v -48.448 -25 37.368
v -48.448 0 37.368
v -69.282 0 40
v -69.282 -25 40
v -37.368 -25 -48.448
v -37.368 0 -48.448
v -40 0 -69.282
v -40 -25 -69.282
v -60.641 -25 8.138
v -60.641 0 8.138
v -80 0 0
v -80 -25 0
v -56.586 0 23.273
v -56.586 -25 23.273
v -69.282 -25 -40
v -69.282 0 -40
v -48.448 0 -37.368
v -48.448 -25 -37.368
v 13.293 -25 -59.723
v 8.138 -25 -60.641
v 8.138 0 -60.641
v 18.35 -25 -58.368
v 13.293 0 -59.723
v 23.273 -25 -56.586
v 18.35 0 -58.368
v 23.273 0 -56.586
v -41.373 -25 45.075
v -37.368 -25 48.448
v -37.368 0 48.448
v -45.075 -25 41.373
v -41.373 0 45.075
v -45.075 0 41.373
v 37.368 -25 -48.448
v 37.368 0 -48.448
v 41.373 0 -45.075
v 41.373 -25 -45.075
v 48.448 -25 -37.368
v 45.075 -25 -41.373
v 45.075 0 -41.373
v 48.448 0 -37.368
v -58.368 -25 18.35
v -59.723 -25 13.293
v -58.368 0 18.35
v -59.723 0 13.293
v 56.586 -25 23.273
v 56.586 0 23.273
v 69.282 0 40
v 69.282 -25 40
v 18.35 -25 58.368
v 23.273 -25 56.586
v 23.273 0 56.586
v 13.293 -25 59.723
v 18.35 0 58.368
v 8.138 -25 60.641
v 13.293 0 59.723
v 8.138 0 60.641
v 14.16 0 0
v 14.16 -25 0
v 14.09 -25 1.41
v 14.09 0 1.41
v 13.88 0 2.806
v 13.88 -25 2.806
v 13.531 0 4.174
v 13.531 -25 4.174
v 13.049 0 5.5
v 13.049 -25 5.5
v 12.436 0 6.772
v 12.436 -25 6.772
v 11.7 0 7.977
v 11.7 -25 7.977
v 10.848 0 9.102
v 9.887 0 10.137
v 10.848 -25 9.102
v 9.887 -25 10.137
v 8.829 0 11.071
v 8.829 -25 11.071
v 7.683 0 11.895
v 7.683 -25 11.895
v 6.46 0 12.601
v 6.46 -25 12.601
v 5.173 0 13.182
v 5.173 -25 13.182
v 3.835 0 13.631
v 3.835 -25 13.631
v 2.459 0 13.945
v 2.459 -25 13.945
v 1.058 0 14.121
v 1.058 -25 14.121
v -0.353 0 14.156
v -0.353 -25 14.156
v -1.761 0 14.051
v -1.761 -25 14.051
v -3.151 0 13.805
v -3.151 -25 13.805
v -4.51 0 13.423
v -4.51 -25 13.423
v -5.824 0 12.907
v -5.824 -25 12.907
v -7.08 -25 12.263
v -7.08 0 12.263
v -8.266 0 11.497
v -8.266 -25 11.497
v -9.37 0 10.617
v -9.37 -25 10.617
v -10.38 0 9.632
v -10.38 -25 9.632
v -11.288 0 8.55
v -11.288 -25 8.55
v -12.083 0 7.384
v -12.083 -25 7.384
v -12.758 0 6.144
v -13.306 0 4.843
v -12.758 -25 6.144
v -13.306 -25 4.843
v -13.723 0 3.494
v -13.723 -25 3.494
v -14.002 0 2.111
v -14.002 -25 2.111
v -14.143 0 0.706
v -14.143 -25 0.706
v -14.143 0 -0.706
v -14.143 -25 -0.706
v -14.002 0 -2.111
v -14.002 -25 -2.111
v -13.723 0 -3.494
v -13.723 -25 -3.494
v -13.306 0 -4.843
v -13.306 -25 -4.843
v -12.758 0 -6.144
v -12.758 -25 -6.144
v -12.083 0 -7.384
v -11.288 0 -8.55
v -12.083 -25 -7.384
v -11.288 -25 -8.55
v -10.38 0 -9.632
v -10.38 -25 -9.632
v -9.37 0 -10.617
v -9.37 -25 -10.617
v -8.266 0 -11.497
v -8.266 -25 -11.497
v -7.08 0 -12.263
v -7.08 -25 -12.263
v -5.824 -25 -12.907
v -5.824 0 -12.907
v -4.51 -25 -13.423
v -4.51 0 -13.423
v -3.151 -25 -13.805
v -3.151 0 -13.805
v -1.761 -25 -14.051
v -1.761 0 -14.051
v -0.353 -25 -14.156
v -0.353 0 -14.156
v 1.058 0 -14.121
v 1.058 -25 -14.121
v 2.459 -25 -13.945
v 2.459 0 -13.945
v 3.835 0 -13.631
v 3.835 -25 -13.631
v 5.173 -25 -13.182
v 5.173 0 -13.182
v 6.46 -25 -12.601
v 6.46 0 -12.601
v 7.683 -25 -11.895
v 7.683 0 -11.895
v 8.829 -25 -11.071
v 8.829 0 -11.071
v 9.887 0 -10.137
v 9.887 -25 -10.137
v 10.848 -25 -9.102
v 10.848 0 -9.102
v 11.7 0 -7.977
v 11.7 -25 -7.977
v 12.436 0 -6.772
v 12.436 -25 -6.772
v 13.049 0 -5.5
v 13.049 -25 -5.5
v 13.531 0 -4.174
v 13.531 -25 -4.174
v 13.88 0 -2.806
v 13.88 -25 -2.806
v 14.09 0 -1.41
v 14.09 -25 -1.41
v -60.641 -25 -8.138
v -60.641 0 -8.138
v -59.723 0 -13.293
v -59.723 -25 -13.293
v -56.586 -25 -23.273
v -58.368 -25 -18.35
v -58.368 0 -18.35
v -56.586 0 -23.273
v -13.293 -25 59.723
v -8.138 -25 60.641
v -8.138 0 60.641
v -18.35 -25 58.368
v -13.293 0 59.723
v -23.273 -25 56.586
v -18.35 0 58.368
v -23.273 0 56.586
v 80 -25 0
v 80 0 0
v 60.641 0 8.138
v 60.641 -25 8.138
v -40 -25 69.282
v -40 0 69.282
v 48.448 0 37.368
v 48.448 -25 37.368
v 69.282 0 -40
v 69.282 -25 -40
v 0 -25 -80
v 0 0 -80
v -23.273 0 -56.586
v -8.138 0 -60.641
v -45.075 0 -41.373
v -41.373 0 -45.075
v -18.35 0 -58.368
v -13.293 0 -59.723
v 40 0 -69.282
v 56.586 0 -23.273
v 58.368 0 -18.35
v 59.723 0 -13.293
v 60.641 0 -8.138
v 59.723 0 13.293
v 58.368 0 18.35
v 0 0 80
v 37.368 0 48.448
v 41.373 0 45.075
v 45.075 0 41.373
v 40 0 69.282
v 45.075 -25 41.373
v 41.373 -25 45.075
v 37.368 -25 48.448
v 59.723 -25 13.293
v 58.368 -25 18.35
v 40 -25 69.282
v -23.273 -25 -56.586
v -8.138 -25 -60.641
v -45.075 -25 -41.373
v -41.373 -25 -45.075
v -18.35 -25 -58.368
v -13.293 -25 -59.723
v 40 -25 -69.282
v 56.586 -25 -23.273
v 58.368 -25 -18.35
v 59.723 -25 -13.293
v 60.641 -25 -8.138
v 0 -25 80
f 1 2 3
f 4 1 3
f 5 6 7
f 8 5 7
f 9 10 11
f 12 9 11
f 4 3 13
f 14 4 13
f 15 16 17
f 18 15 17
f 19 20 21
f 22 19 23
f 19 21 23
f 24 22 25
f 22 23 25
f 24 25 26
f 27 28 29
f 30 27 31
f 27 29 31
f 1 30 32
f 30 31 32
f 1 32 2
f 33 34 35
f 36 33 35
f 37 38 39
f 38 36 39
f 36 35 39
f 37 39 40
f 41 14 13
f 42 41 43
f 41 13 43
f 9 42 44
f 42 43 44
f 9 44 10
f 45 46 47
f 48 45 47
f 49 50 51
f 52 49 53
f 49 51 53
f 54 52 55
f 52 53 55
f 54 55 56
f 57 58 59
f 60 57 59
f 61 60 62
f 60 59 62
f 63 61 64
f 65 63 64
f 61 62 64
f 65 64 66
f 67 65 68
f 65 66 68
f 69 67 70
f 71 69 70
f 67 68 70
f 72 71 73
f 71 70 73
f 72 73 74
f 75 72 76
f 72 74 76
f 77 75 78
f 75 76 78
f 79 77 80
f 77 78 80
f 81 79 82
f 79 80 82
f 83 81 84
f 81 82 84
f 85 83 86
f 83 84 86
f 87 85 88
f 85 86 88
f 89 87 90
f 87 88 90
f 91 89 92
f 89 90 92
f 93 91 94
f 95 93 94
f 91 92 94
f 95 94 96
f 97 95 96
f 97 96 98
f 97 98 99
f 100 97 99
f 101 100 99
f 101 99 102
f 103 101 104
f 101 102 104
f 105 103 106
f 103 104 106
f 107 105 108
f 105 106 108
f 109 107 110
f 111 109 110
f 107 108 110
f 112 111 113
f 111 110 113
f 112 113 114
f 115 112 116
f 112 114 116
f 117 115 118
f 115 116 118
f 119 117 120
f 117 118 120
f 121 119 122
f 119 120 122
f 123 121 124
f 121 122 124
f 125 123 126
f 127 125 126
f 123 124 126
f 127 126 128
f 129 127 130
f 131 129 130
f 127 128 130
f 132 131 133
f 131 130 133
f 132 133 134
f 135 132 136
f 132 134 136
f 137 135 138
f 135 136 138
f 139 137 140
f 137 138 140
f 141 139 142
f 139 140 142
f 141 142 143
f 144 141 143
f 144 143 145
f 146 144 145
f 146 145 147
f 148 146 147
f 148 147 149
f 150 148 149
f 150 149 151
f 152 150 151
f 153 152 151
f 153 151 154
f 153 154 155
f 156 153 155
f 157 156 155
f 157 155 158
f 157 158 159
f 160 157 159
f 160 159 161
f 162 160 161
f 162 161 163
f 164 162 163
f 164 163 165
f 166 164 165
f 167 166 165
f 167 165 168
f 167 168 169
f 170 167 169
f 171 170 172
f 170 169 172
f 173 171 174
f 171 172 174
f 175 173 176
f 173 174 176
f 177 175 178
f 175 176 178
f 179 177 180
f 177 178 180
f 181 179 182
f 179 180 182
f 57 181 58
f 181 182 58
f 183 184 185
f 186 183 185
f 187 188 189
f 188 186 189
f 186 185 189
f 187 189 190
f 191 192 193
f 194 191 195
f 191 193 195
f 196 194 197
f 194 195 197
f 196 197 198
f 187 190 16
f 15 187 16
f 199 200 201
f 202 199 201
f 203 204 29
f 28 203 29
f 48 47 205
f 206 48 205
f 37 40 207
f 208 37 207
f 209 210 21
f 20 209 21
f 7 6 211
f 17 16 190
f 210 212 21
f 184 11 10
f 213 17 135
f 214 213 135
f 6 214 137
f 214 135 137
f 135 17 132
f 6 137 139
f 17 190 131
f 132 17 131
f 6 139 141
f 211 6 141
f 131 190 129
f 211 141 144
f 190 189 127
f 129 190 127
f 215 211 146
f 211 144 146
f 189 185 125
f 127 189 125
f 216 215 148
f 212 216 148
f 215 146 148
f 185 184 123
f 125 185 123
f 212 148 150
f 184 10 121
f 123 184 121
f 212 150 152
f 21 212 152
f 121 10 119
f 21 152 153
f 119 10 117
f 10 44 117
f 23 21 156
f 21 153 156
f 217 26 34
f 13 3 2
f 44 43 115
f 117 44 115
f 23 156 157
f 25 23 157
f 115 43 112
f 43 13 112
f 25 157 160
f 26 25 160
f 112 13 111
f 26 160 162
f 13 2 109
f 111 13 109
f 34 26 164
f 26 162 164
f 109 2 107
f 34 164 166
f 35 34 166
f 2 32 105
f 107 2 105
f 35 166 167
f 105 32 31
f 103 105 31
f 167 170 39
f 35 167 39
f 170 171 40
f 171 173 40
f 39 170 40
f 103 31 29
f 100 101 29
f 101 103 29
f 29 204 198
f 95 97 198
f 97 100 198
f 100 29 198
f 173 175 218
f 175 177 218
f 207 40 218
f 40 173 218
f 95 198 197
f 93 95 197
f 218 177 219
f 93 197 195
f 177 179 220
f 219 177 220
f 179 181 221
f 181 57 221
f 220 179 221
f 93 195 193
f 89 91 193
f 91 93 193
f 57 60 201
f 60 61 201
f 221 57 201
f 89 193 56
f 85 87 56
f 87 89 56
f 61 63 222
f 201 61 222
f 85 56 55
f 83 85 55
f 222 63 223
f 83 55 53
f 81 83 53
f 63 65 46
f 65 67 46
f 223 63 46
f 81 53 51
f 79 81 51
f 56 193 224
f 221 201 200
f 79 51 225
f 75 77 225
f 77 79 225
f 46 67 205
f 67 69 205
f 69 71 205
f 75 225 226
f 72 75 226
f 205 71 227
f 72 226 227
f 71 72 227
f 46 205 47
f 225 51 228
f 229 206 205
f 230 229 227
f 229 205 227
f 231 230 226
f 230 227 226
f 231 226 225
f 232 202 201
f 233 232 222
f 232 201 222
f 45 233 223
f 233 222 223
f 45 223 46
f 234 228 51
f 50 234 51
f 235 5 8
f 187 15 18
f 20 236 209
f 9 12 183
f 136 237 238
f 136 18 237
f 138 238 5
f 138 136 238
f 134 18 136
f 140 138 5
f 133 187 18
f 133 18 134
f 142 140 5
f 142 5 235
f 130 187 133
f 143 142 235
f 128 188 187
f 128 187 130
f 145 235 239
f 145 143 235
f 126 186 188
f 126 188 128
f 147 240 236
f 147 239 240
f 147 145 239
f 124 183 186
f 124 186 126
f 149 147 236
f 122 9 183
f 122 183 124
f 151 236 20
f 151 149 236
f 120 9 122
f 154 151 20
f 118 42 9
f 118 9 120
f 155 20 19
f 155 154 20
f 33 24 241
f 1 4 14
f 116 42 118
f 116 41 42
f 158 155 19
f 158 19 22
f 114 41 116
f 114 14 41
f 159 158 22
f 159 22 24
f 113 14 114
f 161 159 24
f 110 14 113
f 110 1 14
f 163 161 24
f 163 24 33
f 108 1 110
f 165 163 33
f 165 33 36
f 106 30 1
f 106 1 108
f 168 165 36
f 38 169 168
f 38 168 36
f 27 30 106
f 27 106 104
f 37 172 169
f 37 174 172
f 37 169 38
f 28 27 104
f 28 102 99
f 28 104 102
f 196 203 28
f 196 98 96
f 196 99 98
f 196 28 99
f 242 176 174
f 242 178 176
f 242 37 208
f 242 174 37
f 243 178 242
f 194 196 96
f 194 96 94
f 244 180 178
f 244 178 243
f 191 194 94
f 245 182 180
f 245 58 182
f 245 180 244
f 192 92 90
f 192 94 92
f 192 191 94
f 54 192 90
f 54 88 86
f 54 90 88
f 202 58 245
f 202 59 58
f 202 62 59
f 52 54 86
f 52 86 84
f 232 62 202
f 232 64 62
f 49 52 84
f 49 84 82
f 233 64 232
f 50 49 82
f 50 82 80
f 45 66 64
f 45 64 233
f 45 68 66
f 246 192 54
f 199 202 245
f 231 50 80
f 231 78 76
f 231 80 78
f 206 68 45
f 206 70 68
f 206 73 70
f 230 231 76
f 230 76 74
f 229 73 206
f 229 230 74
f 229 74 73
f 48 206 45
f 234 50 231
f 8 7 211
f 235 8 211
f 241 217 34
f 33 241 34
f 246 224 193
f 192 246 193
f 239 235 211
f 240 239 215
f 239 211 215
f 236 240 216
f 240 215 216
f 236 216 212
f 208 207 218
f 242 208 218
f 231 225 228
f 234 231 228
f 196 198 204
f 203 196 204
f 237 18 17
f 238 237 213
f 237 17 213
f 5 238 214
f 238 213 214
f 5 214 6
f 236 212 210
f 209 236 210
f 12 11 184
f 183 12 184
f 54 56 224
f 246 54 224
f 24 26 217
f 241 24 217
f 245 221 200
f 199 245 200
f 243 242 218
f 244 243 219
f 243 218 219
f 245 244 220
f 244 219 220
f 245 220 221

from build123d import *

# Parameters (mm, degrees)
F0_R            = 61.184507213
F1_DEPTH        = 25
F2_R            = 14.1604507034
F3_DEPTH        = 25
F5_DEPTH        = 25
F5_COPIES_COUNT = 12


# Not quite as in the source:
# - a pattern or mirror of a feature is missing from the dataset's text; its kind, count and spacing are read off the source's solid


with BuildPart() as f1:
    # F0 (on Front) → F1 (new body)
    with BuildSketch(Plane.XZ):
        Circle(F0_R)
    extrude(amount=F1_DEPTH)

    # F2 (on face) → F3 (cut)
    with BuildSketch(Plane.XZ.offset(25)):
        Circle(F2_R)
    extrude(amount=-F3_DEPTH, mode=Mode.SUBTRACT)

    # F4 (on Front) → F5 (join)
    with BuildSketch(Plane.XZ):
        with BuildLine():
            Line((0, 80), (-8.1378884566, 60.6408995181))
            ThreePointArc((-8.1378884566, 60.6408995181), (0, 61.184507213), (8.1378884566, 60.6408995181))
            Line((8.1378884566, 60.6408995181), (0, 80))
        make_face()
    f5 = extrude(amount=F5_DEPTH)

    # F5_copies: F5 ×12 about axis
    f5_copies_axis = Axis((0, 0, 0), (0, 1, 0))
    for i in range(1, F5_COPIES_COUNT):
        add(f5.rotate(f5_copies_axis, i * 360 / F5_COPIES_COUNT))


solid = f1.part
